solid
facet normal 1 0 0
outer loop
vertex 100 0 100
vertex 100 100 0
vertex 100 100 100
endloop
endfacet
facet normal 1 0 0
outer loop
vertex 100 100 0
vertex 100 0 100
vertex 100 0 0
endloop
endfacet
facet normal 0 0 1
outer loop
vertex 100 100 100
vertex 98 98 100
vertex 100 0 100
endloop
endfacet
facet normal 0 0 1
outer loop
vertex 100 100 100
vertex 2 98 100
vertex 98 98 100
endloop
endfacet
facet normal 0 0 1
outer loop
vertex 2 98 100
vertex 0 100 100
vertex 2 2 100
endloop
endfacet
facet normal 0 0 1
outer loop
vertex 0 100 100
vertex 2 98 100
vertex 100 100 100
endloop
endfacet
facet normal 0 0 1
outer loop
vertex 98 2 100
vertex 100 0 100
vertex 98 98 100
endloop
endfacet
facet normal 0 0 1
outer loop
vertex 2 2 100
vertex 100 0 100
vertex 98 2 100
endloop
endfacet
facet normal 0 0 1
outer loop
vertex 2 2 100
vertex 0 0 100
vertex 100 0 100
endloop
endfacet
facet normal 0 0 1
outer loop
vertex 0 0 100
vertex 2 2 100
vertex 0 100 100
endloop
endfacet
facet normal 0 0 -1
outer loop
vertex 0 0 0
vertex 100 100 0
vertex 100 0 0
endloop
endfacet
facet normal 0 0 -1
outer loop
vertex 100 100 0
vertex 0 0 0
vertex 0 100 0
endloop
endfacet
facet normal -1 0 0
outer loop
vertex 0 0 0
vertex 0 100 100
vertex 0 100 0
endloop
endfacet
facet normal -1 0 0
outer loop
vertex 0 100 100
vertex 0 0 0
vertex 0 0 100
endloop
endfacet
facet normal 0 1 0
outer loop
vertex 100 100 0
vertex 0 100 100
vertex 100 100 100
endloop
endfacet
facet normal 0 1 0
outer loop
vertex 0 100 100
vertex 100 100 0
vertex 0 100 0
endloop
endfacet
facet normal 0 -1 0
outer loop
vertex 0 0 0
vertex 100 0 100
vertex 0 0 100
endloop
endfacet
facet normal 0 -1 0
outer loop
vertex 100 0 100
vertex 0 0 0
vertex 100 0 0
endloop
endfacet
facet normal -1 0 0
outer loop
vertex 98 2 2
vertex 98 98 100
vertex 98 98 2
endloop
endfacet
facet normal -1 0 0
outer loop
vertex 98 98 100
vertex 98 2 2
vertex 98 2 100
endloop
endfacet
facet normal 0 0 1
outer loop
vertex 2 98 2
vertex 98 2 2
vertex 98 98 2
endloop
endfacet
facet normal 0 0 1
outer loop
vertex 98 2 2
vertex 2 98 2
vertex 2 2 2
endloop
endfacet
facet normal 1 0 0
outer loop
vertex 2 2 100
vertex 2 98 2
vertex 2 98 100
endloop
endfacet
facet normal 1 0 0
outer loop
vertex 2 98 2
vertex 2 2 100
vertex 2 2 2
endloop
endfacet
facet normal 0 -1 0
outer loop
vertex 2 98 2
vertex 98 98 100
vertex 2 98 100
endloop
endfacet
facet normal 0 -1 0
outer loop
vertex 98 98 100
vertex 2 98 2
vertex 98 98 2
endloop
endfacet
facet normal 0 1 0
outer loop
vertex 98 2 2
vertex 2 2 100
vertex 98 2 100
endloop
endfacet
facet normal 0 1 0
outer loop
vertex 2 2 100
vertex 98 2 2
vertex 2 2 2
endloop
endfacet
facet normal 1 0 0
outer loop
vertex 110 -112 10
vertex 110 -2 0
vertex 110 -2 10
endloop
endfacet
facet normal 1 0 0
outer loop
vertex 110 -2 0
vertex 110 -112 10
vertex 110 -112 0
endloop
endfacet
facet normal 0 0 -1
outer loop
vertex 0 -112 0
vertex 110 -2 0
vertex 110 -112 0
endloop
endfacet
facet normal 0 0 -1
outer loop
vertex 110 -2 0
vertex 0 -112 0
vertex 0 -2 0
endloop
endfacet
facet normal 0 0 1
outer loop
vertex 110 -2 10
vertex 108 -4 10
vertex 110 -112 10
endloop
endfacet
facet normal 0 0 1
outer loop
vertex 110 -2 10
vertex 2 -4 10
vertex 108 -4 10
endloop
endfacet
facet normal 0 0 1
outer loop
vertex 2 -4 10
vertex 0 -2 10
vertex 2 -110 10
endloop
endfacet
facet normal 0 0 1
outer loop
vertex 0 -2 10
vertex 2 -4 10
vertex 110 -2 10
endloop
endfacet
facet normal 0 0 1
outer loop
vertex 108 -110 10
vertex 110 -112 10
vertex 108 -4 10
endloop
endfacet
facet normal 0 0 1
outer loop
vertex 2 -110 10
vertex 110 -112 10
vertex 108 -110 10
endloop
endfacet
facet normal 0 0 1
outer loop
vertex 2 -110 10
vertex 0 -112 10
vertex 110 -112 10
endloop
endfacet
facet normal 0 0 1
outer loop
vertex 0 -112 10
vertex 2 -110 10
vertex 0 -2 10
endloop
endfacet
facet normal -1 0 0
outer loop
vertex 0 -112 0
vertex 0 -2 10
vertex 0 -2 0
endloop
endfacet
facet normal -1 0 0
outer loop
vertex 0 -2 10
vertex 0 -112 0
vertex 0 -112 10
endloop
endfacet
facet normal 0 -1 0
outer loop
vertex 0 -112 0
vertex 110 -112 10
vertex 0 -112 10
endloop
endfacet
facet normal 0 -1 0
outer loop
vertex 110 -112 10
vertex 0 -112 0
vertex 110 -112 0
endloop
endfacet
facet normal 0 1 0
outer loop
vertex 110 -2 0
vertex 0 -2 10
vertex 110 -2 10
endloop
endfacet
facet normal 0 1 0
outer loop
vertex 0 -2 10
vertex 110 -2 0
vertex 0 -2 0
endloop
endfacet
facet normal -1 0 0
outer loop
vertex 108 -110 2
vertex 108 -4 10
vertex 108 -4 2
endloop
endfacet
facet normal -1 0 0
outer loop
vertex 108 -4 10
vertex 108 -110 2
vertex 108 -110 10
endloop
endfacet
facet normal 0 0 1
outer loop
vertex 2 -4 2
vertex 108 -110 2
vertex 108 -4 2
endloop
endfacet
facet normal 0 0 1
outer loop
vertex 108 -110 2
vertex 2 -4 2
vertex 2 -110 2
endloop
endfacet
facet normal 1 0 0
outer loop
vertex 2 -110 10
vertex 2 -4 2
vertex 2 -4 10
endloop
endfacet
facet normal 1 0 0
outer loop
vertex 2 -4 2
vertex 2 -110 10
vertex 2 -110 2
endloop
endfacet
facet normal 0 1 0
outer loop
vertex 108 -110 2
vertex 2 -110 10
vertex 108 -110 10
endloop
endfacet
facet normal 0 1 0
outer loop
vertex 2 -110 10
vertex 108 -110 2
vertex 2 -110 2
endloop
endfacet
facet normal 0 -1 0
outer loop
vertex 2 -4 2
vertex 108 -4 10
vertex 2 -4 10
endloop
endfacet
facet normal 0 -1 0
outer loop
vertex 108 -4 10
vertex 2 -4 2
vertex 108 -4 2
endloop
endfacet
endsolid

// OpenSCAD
// Não usar BOSL2
// Projeto: Caixa de com tampa

// Dimensões da caixa
//x
width = 100;
//z
height = 100;
//y
depth = 100;

lid_height = 10;
lid_thickness = 2;
lid_width = width + 5 * lid_thickness;
lid_depth = depth + 5 * lid_thickness;

// Espessura da caixa
thickness_wall = 2;

//Caixa
difference() {
    cube([width, depth, height]);
    color("red")
    translate([thickness_wall, thickness_wall, thickness_wall]) 
        cube([
            width - 2 * thickness_wall,
            depth - 2 * thickness_wall,
            height - thickness_wall
        ]);
};

// Tampa
rotate([180, 0, 0])
translate([ 0, 2, -10 ])
difference(){
cube([lid_width, lid_depth, lid_height ]);
color("red")
translate([lid_thickness, lid_thickness, -lid_thickness])
    cube([lid_width-2*lid_thickness, lid_depth-2*lid_thickness, lid_height]);
};
